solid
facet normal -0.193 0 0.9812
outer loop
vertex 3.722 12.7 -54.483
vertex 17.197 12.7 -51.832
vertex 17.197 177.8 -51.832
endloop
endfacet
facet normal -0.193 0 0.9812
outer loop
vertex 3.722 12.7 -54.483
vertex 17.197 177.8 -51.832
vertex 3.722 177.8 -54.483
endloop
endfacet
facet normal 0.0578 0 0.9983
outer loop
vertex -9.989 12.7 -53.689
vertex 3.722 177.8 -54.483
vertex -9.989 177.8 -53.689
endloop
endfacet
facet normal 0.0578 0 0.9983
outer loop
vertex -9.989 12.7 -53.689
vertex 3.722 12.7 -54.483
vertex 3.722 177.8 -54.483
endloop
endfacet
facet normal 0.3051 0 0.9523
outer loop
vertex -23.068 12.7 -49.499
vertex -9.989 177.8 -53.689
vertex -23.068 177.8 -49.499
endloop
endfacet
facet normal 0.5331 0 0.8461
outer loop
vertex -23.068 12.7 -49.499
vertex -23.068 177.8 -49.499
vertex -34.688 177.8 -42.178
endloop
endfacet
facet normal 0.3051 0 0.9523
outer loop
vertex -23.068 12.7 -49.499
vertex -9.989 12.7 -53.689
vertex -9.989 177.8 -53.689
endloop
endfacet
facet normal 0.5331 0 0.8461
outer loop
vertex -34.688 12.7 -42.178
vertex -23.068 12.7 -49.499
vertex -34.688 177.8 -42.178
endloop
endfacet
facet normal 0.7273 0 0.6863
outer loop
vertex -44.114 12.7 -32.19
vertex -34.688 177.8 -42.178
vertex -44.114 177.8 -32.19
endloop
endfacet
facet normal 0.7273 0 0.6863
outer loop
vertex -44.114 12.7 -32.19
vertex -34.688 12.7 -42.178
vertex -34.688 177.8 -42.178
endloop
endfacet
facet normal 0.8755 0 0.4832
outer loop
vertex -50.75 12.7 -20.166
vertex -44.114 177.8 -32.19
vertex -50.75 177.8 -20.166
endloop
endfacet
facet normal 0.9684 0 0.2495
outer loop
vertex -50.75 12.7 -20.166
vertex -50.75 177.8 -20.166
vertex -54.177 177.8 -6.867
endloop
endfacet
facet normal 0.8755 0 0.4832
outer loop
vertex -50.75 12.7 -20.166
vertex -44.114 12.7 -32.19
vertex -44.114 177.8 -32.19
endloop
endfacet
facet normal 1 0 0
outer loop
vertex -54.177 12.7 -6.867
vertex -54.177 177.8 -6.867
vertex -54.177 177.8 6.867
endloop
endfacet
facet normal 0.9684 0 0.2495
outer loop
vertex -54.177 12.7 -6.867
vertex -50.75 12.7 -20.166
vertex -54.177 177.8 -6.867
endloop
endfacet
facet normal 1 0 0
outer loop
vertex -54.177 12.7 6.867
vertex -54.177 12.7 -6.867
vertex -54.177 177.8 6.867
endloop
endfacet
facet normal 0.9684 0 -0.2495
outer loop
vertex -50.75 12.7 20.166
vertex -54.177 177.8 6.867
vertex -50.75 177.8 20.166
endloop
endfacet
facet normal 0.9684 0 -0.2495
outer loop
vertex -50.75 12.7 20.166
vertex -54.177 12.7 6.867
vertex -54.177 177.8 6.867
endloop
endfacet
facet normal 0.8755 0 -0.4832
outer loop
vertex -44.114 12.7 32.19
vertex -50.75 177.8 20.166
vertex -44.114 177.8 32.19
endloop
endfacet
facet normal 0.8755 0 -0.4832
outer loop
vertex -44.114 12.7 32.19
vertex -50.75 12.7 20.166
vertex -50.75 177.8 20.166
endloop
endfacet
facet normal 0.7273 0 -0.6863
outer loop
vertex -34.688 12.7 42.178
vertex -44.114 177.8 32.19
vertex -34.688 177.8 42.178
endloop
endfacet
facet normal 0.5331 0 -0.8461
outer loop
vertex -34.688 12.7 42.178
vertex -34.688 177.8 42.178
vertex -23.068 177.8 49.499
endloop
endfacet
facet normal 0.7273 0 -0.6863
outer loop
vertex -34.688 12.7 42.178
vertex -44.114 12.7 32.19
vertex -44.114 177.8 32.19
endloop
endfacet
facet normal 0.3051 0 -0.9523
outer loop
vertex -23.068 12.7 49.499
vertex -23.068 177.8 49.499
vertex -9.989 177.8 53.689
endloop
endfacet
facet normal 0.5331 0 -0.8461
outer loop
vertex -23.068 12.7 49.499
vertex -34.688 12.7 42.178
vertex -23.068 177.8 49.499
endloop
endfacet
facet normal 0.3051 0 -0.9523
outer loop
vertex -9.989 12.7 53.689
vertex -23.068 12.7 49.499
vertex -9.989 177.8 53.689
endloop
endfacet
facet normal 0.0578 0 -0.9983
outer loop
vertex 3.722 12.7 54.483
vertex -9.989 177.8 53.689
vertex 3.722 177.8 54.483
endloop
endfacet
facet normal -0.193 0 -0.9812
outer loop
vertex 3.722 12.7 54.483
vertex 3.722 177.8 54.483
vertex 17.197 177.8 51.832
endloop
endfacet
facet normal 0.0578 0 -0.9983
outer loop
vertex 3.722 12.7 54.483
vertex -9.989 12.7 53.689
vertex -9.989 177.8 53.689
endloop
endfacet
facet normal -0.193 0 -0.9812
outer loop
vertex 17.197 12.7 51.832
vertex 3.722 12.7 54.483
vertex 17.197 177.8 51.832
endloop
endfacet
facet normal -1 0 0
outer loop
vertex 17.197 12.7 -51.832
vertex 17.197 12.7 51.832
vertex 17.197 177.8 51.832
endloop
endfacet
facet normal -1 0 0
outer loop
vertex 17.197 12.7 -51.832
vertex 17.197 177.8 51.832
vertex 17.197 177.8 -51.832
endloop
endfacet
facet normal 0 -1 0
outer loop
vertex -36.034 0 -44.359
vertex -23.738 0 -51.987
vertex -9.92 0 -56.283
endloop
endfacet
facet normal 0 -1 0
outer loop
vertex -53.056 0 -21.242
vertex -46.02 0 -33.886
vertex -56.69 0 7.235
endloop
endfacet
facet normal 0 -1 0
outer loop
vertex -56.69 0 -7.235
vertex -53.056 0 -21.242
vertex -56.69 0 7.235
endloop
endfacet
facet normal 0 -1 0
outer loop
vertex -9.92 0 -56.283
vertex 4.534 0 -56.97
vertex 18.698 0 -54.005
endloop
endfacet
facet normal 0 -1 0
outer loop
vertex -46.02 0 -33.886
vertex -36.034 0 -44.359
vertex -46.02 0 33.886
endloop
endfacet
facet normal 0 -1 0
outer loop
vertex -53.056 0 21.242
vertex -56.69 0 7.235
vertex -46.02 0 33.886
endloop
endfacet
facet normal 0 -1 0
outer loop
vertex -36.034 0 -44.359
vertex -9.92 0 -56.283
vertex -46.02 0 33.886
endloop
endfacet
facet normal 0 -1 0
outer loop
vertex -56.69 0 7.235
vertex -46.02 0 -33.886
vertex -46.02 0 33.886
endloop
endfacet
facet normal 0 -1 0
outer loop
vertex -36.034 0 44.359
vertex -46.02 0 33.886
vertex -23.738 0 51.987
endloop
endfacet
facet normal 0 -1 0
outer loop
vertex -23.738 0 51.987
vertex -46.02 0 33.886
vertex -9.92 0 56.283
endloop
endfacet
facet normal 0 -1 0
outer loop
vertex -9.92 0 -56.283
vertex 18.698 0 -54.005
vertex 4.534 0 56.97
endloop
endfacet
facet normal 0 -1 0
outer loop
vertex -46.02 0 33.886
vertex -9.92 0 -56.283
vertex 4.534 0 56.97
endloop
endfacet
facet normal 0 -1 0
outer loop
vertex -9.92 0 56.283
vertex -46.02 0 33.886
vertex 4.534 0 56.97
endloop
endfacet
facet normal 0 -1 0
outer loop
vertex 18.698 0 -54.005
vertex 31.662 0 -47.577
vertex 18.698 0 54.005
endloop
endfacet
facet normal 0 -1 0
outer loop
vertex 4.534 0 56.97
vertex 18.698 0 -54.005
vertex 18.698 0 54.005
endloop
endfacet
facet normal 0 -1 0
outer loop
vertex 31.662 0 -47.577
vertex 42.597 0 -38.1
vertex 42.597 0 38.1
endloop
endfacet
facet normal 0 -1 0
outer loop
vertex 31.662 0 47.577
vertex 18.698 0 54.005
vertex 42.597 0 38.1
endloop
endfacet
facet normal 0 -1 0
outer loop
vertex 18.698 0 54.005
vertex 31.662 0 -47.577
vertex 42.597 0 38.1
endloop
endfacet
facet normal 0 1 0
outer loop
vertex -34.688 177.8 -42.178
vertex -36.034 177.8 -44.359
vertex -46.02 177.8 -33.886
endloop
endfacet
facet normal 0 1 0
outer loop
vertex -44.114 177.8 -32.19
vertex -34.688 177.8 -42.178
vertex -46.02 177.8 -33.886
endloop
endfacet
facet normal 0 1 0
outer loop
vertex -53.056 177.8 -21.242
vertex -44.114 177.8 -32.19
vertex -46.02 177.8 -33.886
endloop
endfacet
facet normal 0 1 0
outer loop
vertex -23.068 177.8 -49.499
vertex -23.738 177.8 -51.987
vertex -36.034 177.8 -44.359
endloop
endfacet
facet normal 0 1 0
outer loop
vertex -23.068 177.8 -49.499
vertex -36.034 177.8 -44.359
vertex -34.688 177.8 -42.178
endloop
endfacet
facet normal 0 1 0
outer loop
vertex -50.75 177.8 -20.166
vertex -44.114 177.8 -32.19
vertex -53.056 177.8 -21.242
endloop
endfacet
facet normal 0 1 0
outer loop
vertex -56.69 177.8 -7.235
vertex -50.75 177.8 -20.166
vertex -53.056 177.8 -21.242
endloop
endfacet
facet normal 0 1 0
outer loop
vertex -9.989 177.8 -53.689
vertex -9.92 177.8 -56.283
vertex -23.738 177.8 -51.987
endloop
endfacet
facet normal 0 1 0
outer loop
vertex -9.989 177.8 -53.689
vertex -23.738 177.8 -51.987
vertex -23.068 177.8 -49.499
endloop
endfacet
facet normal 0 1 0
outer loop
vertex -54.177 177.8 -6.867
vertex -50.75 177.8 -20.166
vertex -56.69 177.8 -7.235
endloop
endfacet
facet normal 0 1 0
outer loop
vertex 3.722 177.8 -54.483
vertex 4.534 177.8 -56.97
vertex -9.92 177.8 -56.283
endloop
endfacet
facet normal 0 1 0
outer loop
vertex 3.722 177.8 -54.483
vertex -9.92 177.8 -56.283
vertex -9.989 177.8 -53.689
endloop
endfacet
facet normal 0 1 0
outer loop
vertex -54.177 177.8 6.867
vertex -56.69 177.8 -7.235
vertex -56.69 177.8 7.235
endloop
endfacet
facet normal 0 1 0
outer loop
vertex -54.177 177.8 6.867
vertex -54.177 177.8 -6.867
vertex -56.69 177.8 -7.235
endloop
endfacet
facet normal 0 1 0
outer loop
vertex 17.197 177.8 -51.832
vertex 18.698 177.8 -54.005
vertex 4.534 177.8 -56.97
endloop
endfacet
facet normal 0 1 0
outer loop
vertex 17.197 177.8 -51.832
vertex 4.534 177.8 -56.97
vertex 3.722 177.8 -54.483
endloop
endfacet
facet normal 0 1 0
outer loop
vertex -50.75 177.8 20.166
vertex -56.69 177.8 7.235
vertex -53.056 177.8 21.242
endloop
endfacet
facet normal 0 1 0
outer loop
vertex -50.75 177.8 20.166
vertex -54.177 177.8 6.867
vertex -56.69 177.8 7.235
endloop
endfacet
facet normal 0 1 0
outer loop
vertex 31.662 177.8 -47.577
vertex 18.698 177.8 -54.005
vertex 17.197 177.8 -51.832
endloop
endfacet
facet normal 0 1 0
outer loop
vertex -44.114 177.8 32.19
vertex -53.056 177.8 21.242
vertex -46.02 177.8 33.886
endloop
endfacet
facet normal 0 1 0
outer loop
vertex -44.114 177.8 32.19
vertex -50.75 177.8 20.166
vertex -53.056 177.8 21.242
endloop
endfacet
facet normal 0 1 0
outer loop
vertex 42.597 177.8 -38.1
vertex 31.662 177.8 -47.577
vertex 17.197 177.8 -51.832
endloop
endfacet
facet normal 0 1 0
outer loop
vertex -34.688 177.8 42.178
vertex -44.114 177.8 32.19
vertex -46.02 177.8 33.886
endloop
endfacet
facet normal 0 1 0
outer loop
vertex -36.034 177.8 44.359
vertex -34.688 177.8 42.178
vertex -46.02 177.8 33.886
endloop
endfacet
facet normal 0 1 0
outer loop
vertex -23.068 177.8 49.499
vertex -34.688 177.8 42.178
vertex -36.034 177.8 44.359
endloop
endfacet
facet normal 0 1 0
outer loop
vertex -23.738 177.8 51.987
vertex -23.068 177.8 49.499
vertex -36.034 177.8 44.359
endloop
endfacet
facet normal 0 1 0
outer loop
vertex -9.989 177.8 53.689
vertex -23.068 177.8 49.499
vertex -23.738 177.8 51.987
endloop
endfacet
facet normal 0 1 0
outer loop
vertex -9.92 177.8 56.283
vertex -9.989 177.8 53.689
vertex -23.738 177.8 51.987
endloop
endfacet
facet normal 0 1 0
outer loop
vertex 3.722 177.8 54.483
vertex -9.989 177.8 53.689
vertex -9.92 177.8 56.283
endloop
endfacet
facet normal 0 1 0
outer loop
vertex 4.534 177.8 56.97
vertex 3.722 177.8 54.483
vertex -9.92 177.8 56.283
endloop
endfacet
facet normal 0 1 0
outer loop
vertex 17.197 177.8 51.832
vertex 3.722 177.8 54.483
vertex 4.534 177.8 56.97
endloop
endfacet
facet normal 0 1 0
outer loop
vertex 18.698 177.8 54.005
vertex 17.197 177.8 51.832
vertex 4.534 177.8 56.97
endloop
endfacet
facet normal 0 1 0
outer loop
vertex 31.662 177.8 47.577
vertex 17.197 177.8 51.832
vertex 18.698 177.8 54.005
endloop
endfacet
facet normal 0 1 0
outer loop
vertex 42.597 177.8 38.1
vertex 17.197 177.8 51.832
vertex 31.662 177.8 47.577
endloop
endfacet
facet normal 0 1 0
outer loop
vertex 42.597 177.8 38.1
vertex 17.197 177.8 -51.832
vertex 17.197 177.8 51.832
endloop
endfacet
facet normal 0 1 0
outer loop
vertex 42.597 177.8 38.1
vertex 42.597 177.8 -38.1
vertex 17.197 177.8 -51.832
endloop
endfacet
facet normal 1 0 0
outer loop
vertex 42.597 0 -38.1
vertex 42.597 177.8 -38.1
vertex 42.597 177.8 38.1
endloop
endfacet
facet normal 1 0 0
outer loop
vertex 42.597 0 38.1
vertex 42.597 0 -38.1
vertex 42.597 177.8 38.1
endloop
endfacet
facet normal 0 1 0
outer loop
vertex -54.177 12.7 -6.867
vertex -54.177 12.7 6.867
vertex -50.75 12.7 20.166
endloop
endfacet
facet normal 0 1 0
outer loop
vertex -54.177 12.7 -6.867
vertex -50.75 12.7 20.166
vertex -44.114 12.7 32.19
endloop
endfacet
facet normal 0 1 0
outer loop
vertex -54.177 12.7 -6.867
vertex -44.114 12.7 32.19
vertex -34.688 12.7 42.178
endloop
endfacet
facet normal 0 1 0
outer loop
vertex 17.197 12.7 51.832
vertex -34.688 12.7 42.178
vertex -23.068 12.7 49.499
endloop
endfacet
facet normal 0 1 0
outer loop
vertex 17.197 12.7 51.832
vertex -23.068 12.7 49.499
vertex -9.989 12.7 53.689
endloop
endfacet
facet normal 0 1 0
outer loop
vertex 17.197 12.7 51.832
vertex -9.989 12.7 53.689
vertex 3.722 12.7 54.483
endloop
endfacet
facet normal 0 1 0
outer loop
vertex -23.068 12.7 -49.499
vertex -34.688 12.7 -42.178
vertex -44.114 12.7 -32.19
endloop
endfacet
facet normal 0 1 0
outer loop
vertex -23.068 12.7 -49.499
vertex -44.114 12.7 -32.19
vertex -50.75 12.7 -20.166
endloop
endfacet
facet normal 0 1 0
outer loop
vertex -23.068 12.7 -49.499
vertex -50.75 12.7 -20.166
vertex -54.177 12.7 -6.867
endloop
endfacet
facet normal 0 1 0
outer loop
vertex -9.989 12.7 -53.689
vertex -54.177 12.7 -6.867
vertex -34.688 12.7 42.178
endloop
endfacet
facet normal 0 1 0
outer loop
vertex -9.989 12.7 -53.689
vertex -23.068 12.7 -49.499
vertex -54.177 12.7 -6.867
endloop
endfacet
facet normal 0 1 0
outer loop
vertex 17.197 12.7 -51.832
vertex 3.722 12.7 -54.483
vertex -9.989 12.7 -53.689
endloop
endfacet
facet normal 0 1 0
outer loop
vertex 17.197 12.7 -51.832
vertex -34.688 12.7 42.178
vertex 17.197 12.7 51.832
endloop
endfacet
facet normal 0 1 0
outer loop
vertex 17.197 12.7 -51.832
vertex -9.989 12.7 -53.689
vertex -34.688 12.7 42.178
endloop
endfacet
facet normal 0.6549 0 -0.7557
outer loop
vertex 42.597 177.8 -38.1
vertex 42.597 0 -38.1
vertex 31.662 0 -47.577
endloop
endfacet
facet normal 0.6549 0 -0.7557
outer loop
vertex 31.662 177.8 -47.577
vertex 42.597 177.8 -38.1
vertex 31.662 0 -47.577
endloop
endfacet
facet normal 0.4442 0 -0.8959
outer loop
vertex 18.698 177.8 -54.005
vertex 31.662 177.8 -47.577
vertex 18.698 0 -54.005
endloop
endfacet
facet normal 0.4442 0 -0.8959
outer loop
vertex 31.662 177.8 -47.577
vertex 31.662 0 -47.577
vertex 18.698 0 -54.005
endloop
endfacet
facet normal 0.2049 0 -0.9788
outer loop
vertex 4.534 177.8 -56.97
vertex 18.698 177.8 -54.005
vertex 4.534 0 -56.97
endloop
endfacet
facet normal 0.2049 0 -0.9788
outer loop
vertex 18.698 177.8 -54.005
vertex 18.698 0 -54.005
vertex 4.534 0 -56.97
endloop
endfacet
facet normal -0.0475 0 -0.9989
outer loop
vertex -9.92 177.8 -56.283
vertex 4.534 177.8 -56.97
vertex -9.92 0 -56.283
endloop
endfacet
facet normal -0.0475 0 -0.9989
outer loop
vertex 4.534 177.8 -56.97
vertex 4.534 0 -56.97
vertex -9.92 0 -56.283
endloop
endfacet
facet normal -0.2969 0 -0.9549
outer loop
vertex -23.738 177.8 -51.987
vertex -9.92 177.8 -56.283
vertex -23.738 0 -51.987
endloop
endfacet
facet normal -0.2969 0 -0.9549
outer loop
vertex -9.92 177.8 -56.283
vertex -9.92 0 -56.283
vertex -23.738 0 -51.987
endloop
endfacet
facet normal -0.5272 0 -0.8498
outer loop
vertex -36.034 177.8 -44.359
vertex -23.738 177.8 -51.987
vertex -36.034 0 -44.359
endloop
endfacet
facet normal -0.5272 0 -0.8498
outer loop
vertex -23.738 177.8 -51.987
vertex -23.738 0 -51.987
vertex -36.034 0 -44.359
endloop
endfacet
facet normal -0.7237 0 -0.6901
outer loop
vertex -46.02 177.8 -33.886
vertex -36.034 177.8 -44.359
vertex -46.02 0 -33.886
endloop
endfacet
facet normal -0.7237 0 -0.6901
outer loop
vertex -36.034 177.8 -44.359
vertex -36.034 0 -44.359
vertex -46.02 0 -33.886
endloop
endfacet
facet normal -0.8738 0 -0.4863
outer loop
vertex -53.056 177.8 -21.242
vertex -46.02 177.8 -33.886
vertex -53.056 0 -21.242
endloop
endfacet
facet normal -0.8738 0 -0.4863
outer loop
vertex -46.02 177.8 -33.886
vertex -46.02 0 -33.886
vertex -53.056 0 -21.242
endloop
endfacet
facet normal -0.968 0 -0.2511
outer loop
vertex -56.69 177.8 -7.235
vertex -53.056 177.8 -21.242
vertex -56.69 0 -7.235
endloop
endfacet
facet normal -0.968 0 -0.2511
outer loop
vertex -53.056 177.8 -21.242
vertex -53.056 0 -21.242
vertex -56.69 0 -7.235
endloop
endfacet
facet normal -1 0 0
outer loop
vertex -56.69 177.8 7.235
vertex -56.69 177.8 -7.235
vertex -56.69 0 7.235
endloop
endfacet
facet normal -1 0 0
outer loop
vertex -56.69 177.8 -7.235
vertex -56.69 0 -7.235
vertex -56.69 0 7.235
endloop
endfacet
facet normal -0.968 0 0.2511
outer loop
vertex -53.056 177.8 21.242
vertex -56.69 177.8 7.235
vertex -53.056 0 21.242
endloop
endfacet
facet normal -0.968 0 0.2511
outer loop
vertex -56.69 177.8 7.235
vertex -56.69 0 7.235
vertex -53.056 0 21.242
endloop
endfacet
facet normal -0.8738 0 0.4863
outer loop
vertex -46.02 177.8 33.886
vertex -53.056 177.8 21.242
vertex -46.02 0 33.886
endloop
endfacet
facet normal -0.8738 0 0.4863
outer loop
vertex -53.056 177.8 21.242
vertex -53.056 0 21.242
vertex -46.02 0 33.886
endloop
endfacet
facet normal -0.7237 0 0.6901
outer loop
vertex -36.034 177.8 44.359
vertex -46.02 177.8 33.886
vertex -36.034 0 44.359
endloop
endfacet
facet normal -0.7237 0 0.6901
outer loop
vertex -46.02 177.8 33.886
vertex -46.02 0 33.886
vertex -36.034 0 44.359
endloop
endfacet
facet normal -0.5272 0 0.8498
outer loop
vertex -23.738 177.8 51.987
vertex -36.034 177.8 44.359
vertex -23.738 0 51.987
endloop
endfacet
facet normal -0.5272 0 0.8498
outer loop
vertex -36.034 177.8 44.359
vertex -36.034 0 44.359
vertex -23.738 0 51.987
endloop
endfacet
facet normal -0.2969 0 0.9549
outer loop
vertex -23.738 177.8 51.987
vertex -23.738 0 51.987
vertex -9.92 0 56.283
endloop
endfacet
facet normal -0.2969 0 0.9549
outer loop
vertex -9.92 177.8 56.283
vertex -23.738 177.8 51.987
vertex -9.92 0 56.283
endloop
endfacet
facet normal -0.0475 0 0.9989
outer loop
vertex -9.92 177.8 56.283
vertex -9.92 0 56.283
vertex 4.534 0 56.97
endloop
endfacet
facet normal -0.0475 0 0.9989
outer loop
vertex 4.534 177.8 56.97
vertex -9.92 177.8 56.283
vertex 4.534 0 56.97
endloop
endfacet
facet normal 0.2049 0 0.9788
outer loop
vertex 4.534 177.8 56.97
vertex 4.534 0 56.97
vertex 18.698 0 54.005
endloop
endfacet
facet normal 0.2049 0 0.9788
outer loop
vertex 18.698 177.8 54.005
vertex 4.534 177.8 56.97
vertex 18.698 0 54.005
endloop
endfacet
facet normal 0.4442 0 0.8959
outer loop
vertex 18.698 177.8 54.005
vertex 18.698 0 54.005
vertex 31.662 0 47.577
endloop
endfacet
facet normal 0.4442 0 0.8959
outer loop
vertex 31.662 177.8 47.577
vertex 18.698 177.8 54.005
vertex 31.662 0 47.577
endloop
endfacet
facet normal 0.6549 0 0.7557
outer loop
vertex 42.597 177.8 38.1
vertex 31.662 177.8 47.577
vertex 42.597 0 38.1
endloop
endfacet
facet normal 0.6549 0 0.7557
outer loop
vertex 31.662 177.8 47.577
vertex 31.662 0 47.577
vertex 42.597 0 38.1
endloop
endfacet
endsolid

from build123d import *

# Parameters (mm, degrees)
SKETCH1_R           = 57.15
BOSS_EXTRUDE1_DEPTH = 177.8
CUT_EXTRUDE1_DEPTH  = 196.30766754
SHELL1_START        = 12.7
SHELL1_DEPTH        = 165.1


# Read off the part's stored shape, not the designer's step: Shell1
with BuildPart() as part:
    # Sketch1 → Boss-Extrude1 (new body)
    with BuildSketch(Plane(origin=(0, 0, 0), x_dir=(1, 0, 0), z_dir=(0, 1, 0))):
        with Locations(Location((0, 0, 0), (0, 0, 270))):
            Circle(SKETCH1_R)
    extrude(amount=BOSS_EXTRUDE1_DEPTH)

    # Sketch2 → Cut-Extrude1 (cut, through all)
    with BuildSketch(Plane(origin=(0, 177.8, 0), x_dir=(1, 0, 0), z_dir=(0, 1, 0))):
        Polygon((42.597094971, 323.940863218), (42.597094971, 38.1), (42.597094971, -38.1), (42.597094971, -323.940863218), (614.278821408, -323.940863218), (614.278821408, 323.940863218), align=None)
    extrude(amount=-CUT_EXTRUDE1_DEPTH, mode=Mode.SUBTRACT)

    # Shell1 outline → Shell1 (cut)
    with BuildSketch(Plane(origin=(0, 0, 0), x_dir=(1, 0, 0), z_dir=(0, 1, 0)).offset(SHELL1_START)):
        with BuildLine():
            ThreePointArc((17.197094971, 51.831573626), (-54.61, 0), (17.197094971, -51.831573626))
            Line((17.197094971, -51.831573626), (17.197094971, 51.831573626))
        make_face()
    extrude(amount=SHELL1_DEPTH, mode=Mode.SUBTRACT)


solid = part.part
